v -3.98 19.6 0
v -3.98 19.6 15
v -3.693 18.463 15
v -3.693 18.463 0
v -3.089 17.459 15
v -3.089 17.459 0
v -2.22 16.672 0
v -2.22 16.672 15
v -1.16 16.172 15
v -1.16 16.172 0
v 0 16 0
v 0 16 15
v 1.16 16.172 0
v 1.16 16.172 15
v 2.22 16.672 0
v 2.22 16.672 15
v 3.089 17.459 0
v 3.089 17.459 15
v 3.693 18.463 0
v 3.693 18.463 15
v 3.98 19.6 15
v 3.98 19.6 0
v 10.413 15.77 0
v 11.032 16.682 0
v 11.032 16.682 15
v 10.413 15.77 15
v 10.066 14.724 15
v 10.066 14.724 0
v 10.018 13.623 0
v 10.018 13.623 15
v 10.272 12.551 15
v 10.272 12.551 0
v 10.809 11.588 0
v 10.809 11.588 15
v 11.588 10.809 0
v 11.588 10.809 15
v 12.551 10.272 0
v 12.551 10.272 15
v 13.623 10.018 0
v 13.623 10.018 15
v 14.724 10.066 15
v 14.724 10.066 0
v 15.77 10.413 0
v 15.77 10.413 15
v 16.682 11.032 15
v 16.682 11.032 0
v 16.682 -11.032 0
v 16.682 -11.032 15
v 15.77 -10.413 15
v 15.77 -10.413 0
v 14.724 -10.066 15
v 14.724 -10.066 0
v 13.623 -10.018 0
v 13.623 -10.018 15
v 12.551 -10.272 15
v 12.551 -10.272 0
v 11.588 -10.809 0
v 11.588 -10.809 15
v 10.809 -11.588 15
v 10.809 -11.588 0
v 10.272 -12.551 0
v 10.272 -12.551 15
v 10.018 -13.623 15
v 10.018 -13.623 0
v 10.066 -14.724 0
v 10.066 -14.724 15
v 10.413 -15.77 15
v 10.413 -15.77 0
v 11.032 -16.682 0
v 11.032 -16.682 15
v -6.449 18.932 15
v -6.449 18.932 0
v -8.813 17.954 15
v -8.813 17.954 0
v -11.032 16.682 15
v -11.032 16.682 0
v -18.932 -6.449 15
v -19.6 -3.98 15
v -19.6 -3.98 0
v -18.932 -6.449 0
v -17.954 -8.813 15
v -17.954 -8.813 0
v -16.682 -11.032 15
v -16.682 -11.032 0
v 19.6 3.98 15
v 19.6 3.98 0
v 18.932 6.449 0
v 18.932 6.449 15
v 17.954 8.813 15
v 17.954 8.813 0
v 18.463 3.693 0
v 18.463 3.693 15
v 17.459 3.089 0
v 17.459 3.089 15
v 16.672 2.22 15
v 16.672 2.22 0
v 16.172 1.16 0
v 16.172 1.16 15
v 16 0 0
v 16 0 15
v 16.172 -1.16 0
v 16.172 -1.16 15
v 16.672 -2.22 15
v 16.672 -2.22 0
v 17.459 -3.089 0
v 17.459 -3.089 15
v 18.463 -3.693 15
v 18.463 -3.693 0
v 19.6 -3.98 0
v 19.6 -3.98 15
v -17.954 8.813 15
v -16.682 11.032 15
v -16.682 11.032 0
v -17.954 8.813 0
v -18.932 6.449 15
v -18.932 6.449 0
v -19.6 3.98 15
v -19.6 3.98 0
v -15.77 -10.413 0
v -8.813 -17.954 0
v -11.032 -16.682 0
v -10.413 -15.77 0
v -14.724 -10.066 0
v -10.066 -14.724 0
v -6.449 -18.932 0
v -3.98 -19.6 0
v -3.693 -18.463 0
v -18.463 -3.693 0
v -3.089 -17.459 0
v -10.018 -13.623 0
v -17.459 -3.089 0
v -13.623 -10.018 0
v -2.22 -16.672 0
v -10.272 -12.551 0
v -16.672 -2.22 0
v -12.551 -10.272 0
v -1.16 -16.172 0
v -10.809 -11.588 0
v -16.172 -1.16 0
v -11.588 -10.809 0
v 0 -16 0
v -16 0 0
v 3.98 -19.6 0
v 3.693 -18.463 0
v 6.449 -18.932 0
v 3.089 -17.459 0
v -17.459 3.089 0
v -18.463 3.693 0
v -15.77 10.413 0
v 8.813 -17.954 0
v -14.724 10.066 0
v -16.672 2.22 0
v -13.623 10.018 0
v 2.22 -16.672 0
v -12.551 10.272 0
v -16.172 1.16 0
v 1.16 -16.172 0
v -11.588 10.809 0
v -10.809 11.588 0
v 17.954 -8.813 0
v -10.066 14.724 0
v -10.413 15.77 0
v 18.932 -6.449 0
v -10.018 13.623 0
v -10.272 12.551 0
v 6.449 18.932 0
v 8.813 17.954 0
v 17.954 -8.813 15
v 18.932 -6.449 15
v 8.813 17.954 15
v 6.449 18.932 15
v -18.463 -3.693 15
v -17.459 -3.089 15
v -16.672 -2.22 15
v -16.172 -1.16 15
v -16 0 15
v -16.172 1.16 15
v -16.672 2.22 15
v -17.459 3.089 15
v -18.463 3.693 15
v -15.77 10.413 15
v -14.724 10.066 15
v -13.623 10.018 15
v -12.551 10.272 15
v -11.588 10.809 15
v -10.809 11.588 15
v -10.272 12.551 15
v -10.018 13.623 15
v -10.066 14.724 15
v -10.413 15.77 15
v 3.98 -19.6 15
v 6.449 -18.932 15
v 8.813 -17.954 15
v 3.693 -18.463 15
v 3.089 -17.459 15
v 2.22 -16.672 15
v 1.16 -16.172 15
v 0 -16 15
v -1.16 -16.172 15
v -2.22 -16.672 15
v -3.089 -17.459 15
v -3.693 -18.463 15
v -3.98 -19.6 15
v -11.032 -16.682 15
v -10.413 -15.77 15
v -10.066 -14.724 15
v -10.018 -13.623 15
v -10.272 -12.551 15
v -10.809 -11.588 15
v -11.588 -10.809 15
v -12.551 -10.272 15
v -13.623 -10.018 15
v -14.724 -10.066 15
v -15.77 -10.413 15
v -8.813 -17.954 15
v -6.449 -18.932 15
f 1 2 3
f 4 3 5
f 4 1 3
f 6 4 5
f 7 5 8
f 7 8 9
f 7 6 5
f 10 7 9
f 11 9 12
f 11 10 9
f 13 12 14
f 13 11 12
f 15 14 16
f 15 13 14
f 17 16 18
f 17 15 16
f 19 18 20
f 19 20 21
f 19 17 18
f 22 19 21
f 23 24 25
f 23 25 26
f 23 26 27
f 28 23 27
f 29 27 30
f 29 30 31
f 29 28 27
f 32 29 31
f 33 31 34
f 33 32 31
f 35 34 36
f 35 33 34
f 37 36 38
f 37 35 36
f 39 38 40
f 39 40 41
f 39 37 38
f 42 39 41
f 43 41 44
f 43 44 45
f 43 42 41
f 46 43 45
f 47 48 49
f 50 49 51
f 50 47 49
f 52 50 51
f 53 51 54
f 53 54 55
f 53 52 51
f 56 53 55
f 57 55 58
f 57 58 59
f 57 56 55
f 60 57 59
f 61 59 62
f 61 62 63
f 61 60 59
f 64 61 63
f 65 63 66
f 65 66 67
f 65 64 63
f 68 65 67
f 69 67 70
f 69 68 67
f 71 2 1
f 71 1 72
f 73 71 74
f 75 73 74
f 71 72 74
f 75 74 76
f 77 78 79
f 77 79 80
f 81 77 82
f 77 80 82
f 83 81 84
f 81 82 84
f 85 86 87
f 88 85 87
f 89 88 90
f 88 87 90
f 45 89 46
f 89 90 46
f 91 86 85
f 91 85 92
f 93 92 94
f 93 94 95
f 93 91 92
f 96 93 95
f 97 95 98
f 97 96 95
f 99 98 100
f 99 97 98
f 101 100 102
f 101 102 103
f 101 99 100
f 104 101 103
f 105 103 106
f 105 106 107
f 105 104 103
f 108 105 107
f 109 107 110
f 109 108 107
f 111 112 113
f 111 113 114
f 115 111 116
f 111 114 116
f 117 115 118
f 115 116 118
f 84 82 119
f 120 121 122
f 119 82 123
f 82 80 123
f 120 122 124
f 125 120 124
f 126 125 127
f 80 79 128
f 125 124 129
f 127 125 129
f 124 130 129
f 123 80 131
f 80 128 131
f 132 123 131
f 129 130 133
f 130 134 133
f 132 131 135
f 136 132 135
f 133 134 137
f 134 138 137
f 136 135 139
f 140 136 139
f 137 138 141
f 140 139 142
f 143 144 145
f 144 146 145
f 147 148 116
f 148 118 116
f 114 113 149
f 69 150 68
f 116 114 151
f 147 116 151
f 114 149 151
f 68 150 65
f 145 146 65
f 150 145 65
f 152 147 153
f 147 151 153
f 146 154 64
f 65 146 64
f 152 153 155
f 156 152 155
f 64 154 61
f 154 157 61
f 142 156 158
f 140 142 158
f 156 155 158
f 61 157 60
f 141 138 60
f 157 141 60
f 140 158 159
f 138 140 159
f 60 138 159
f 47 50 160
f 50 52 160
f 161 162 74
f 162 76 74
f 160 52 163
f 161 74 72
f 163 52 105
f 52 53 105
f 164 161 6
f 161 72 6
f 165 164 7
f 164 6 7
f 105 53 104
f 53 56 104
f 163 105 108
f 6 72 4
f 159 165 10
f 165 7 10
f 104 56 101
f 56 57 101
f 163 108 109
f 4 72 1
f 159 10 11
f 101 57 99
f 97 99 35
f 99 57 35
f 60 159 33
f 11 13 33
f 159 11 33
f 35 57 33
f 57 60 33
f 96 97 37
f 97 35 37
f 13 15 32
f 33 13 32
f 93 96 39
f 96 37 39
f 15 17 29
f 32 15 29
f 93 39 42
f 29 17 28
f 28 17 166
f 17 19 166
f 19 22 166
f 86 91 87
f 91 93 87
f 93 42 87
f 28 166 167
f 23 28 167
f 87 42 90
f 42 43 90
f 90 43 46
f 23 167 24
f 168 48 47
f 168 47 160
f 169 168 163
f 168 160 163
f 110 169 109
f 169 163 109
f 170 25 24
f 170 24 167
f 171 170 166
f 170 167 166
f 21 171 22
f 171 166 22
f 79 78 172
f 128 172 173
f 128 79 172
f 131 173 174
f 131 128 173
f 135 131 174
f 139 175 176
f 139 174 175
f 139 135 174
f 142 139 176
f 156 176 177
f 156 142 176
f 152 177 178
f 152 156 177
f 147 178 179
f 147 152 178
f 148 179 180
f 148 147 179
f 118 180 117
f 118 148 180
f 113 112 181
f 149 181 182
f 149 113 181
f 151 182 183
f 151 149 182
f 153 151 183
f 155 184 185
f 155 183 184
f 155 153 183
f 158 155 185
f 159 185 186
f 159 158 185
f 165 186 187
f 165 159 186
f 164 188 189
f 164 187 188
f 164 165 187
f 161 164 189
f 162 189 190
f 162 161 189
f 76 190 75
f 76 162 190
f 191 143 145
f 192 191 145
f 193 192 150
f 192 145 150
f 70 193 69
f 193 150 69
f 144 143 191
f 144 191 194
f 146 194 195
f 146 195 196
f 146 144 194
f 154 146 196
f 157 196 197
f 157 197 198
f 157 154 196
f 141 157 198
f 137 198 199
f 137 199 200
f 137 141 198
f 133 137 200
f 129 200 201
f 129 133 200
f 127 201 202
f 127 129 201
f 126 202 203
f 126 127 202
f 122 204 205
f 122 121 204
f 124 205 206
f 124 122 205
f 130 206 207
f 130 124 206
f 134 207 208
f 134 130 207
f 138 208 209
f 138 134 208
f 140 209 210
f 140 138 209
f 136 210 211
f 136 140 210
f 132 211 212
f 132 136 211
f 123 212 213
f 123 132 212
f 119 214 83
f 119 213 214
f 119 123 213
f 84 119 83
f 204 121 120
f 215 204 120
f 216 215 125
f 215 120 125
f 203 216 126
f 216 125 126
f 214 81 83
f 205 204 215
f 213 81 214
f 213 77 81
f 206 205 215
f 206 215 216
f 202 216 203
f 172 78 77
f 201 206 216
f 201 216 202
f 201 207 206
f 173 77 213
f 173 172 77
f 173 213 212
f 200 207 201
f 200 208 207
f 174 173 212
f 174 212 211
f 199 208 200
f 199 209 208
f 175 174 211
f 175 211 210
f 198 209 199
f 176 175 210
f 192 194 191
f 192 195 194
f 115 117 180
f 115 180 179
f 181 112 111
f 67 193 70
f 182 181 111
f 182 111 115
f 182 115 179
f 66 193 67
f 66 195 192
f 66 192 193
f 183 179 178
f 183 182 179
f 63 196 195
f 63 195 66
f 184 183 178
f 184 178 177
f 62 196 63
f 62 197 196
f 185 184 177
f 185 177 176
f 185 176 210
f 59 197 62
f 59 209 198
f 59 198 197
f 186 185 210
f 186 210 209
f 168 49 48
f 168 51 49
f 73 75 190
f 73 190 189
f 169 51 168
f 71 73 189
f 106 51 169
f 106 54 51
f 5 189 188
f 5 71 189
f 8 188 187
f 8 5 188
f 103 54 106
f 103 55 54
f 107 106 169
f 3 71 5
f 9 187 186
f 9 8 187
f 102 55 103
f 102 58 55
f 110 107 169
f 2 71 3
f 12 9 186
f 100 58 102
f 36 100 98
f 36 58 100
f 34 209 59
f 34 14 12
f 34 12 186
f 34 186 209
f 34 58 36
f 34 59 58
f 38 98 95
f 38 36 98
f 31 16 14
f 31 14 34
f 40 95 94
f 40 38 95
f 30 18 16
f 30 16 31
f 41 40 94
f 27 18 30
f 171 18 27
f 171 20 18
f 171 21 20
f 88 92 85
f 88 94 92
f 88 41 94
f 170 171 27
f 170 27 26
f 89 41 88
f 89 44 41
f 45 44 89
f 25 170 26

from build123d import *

# Parameters (mm, degrees)
CYLINDER002_R     = 4
CYLINDER002_DEPTH = 15
CYLINDER003_R     = 4
CYLINDER003_DEPTH = 15
CYLINDER004_R     = 4
CYLINDER004_DEPTH = 15
CYLINDER005_R     = 4
CYLINDER005_DEPTH = 15
CYLINDER007_R     = 4
CYLINDER007_DEPTH = 15
CYLINDER006_R     = 4
CYLINDER006_DEPTH = 15
CYLINDER008_R     = 4
CYLINDER008_DEPTH = 15
CYLINDER001_R     = 4
CYLINDER001_DEPTH = 15
CYLINDER_R        = 20
CYLINDER_DEPTH    = 15


with BuildPart() as cylinder002:
    # Cylinder002 → Cylinder002 (new body)
    with BuildSketch(Plane(origin=(0, 20, 0), x_dir=(1, 0, 0), z_dir=(0, 0, 1))):
        Circle(CYLINDER002_R)
    extrude(amount=CYLINDER002_DEPTH)


with BuildPart() as cylinder003:
    # Cylinder003 → Cylinder003 (new body)
    with BuildSketch(Plane(origin=(-20, 0, 0), x_dir=(1, 0, 0), z_dir=(0, 0, 1))):
        Circle(CYLINDER003_R)
    extrude(amount=CYLINDER003_DEPTH)


with BuildPart() as cylinder004:
    # Cylinder004 → Cylinder004 (new body)
    with BuildSketch(Plane(origin=(0, -20, 0), x_dir=(1, 0, 0), z_dir=(0, 0, 1))):
        Circle(CYLINDER004_R)
    extrude(amount=CYLINDER004_DEPTH)


with BuildPart() as cylinder005:
    # Cylinder005 → Cylinder005 (new body)
    with BuildSketch(Plane(origin=(14, -14, 0), x_dir=(1, 0, 0), z_dir=(0, 0, 1))):
        Circle(CYLINDER005_R)
    extrude(amount=CYLINDER005_DEPTH)


with BuildPart() as cylinder007:
    # Cylinder007 → Cylinder007 (new body)
    with BuildSketch(Plane(origin=(-14, -14, 0), x_dir=(1, 0, 0), z_dir=(0, 0, 1))):
        Circle(CYLINDER007_R)
    extrude(amount=CYLINDER007_DEPTH)


with BuildPart() as cylinder006:
    # Cylinder006 → Cylinder006 (new body)
    with BuildSketch(Plane(origin=(-14, 14, 0), x_dir=(1, 0, 0), z_dir=(0, 0, 1))):
        Circle(CYLINDER006_R)
    extrude(amount=CYLINDER006_DEPTH)


with BuildPart() as cylinder008:
    # Cylinder008 → Cylinder008 (new body)
    with BuildSketch(Plane(origin=(14, 14, 0), x_dir=(1, 0, 0), z_dir=(0, 0, 1))):
        Circle(CYLINDER008_R)
    extrude(amount=CYLINDER008_DEPTH)


with BuildPart() as cylinder001:
    # Cylinder001 → Cylinder001 (new body)
    with BuildSketch(Plane(origin=(20, 0, 0), x_dir=(1, 0, 0), z_dir=(0, 0, 1))):
        Circle(CYLINDER001_R)
    extrude(amount=CYLINDER001_DEPTH)


with BuildPart() as cut007:
    # Cylinder → Cylinder (new body)
    with BuildSketch(Plane.XY):
        Circle(CYLINDER_R)
    extrude(amount=CYLINDER_DEPTH)

    # Cut: cut Cylinder001
    add(cylinder001.part, mode=Mode.SUBTRACT)

    # Cut001: cut Cylinder008
    add(cylinder008.part, mode=Mode.SUBTRACT)

    # Cut002: cut Cylinder006
    add(cylinder006.part, mode=Mode.SUBTRACT)

    # Cut003: cut Cylinder007
    add(cylinder007.part, mode=Mode.SUBTRACT)

    # Cut004: cut Cylinder005
    add(cylinder005.part, mode=Mode.SUBTRACT)

    # Cut005: cut Cylinder004
    add(cylinder004.part, mode=Mode.SUBTRACT)

    # Cut006: cut Cylinder003
    add(cylinder003.part, mode=Mode.SUBTRACT)

    # Cut007: cut Cylinder002
    add(cylinder002.part, mode=Mode.SUBTRACT)


solid = cut007.part
